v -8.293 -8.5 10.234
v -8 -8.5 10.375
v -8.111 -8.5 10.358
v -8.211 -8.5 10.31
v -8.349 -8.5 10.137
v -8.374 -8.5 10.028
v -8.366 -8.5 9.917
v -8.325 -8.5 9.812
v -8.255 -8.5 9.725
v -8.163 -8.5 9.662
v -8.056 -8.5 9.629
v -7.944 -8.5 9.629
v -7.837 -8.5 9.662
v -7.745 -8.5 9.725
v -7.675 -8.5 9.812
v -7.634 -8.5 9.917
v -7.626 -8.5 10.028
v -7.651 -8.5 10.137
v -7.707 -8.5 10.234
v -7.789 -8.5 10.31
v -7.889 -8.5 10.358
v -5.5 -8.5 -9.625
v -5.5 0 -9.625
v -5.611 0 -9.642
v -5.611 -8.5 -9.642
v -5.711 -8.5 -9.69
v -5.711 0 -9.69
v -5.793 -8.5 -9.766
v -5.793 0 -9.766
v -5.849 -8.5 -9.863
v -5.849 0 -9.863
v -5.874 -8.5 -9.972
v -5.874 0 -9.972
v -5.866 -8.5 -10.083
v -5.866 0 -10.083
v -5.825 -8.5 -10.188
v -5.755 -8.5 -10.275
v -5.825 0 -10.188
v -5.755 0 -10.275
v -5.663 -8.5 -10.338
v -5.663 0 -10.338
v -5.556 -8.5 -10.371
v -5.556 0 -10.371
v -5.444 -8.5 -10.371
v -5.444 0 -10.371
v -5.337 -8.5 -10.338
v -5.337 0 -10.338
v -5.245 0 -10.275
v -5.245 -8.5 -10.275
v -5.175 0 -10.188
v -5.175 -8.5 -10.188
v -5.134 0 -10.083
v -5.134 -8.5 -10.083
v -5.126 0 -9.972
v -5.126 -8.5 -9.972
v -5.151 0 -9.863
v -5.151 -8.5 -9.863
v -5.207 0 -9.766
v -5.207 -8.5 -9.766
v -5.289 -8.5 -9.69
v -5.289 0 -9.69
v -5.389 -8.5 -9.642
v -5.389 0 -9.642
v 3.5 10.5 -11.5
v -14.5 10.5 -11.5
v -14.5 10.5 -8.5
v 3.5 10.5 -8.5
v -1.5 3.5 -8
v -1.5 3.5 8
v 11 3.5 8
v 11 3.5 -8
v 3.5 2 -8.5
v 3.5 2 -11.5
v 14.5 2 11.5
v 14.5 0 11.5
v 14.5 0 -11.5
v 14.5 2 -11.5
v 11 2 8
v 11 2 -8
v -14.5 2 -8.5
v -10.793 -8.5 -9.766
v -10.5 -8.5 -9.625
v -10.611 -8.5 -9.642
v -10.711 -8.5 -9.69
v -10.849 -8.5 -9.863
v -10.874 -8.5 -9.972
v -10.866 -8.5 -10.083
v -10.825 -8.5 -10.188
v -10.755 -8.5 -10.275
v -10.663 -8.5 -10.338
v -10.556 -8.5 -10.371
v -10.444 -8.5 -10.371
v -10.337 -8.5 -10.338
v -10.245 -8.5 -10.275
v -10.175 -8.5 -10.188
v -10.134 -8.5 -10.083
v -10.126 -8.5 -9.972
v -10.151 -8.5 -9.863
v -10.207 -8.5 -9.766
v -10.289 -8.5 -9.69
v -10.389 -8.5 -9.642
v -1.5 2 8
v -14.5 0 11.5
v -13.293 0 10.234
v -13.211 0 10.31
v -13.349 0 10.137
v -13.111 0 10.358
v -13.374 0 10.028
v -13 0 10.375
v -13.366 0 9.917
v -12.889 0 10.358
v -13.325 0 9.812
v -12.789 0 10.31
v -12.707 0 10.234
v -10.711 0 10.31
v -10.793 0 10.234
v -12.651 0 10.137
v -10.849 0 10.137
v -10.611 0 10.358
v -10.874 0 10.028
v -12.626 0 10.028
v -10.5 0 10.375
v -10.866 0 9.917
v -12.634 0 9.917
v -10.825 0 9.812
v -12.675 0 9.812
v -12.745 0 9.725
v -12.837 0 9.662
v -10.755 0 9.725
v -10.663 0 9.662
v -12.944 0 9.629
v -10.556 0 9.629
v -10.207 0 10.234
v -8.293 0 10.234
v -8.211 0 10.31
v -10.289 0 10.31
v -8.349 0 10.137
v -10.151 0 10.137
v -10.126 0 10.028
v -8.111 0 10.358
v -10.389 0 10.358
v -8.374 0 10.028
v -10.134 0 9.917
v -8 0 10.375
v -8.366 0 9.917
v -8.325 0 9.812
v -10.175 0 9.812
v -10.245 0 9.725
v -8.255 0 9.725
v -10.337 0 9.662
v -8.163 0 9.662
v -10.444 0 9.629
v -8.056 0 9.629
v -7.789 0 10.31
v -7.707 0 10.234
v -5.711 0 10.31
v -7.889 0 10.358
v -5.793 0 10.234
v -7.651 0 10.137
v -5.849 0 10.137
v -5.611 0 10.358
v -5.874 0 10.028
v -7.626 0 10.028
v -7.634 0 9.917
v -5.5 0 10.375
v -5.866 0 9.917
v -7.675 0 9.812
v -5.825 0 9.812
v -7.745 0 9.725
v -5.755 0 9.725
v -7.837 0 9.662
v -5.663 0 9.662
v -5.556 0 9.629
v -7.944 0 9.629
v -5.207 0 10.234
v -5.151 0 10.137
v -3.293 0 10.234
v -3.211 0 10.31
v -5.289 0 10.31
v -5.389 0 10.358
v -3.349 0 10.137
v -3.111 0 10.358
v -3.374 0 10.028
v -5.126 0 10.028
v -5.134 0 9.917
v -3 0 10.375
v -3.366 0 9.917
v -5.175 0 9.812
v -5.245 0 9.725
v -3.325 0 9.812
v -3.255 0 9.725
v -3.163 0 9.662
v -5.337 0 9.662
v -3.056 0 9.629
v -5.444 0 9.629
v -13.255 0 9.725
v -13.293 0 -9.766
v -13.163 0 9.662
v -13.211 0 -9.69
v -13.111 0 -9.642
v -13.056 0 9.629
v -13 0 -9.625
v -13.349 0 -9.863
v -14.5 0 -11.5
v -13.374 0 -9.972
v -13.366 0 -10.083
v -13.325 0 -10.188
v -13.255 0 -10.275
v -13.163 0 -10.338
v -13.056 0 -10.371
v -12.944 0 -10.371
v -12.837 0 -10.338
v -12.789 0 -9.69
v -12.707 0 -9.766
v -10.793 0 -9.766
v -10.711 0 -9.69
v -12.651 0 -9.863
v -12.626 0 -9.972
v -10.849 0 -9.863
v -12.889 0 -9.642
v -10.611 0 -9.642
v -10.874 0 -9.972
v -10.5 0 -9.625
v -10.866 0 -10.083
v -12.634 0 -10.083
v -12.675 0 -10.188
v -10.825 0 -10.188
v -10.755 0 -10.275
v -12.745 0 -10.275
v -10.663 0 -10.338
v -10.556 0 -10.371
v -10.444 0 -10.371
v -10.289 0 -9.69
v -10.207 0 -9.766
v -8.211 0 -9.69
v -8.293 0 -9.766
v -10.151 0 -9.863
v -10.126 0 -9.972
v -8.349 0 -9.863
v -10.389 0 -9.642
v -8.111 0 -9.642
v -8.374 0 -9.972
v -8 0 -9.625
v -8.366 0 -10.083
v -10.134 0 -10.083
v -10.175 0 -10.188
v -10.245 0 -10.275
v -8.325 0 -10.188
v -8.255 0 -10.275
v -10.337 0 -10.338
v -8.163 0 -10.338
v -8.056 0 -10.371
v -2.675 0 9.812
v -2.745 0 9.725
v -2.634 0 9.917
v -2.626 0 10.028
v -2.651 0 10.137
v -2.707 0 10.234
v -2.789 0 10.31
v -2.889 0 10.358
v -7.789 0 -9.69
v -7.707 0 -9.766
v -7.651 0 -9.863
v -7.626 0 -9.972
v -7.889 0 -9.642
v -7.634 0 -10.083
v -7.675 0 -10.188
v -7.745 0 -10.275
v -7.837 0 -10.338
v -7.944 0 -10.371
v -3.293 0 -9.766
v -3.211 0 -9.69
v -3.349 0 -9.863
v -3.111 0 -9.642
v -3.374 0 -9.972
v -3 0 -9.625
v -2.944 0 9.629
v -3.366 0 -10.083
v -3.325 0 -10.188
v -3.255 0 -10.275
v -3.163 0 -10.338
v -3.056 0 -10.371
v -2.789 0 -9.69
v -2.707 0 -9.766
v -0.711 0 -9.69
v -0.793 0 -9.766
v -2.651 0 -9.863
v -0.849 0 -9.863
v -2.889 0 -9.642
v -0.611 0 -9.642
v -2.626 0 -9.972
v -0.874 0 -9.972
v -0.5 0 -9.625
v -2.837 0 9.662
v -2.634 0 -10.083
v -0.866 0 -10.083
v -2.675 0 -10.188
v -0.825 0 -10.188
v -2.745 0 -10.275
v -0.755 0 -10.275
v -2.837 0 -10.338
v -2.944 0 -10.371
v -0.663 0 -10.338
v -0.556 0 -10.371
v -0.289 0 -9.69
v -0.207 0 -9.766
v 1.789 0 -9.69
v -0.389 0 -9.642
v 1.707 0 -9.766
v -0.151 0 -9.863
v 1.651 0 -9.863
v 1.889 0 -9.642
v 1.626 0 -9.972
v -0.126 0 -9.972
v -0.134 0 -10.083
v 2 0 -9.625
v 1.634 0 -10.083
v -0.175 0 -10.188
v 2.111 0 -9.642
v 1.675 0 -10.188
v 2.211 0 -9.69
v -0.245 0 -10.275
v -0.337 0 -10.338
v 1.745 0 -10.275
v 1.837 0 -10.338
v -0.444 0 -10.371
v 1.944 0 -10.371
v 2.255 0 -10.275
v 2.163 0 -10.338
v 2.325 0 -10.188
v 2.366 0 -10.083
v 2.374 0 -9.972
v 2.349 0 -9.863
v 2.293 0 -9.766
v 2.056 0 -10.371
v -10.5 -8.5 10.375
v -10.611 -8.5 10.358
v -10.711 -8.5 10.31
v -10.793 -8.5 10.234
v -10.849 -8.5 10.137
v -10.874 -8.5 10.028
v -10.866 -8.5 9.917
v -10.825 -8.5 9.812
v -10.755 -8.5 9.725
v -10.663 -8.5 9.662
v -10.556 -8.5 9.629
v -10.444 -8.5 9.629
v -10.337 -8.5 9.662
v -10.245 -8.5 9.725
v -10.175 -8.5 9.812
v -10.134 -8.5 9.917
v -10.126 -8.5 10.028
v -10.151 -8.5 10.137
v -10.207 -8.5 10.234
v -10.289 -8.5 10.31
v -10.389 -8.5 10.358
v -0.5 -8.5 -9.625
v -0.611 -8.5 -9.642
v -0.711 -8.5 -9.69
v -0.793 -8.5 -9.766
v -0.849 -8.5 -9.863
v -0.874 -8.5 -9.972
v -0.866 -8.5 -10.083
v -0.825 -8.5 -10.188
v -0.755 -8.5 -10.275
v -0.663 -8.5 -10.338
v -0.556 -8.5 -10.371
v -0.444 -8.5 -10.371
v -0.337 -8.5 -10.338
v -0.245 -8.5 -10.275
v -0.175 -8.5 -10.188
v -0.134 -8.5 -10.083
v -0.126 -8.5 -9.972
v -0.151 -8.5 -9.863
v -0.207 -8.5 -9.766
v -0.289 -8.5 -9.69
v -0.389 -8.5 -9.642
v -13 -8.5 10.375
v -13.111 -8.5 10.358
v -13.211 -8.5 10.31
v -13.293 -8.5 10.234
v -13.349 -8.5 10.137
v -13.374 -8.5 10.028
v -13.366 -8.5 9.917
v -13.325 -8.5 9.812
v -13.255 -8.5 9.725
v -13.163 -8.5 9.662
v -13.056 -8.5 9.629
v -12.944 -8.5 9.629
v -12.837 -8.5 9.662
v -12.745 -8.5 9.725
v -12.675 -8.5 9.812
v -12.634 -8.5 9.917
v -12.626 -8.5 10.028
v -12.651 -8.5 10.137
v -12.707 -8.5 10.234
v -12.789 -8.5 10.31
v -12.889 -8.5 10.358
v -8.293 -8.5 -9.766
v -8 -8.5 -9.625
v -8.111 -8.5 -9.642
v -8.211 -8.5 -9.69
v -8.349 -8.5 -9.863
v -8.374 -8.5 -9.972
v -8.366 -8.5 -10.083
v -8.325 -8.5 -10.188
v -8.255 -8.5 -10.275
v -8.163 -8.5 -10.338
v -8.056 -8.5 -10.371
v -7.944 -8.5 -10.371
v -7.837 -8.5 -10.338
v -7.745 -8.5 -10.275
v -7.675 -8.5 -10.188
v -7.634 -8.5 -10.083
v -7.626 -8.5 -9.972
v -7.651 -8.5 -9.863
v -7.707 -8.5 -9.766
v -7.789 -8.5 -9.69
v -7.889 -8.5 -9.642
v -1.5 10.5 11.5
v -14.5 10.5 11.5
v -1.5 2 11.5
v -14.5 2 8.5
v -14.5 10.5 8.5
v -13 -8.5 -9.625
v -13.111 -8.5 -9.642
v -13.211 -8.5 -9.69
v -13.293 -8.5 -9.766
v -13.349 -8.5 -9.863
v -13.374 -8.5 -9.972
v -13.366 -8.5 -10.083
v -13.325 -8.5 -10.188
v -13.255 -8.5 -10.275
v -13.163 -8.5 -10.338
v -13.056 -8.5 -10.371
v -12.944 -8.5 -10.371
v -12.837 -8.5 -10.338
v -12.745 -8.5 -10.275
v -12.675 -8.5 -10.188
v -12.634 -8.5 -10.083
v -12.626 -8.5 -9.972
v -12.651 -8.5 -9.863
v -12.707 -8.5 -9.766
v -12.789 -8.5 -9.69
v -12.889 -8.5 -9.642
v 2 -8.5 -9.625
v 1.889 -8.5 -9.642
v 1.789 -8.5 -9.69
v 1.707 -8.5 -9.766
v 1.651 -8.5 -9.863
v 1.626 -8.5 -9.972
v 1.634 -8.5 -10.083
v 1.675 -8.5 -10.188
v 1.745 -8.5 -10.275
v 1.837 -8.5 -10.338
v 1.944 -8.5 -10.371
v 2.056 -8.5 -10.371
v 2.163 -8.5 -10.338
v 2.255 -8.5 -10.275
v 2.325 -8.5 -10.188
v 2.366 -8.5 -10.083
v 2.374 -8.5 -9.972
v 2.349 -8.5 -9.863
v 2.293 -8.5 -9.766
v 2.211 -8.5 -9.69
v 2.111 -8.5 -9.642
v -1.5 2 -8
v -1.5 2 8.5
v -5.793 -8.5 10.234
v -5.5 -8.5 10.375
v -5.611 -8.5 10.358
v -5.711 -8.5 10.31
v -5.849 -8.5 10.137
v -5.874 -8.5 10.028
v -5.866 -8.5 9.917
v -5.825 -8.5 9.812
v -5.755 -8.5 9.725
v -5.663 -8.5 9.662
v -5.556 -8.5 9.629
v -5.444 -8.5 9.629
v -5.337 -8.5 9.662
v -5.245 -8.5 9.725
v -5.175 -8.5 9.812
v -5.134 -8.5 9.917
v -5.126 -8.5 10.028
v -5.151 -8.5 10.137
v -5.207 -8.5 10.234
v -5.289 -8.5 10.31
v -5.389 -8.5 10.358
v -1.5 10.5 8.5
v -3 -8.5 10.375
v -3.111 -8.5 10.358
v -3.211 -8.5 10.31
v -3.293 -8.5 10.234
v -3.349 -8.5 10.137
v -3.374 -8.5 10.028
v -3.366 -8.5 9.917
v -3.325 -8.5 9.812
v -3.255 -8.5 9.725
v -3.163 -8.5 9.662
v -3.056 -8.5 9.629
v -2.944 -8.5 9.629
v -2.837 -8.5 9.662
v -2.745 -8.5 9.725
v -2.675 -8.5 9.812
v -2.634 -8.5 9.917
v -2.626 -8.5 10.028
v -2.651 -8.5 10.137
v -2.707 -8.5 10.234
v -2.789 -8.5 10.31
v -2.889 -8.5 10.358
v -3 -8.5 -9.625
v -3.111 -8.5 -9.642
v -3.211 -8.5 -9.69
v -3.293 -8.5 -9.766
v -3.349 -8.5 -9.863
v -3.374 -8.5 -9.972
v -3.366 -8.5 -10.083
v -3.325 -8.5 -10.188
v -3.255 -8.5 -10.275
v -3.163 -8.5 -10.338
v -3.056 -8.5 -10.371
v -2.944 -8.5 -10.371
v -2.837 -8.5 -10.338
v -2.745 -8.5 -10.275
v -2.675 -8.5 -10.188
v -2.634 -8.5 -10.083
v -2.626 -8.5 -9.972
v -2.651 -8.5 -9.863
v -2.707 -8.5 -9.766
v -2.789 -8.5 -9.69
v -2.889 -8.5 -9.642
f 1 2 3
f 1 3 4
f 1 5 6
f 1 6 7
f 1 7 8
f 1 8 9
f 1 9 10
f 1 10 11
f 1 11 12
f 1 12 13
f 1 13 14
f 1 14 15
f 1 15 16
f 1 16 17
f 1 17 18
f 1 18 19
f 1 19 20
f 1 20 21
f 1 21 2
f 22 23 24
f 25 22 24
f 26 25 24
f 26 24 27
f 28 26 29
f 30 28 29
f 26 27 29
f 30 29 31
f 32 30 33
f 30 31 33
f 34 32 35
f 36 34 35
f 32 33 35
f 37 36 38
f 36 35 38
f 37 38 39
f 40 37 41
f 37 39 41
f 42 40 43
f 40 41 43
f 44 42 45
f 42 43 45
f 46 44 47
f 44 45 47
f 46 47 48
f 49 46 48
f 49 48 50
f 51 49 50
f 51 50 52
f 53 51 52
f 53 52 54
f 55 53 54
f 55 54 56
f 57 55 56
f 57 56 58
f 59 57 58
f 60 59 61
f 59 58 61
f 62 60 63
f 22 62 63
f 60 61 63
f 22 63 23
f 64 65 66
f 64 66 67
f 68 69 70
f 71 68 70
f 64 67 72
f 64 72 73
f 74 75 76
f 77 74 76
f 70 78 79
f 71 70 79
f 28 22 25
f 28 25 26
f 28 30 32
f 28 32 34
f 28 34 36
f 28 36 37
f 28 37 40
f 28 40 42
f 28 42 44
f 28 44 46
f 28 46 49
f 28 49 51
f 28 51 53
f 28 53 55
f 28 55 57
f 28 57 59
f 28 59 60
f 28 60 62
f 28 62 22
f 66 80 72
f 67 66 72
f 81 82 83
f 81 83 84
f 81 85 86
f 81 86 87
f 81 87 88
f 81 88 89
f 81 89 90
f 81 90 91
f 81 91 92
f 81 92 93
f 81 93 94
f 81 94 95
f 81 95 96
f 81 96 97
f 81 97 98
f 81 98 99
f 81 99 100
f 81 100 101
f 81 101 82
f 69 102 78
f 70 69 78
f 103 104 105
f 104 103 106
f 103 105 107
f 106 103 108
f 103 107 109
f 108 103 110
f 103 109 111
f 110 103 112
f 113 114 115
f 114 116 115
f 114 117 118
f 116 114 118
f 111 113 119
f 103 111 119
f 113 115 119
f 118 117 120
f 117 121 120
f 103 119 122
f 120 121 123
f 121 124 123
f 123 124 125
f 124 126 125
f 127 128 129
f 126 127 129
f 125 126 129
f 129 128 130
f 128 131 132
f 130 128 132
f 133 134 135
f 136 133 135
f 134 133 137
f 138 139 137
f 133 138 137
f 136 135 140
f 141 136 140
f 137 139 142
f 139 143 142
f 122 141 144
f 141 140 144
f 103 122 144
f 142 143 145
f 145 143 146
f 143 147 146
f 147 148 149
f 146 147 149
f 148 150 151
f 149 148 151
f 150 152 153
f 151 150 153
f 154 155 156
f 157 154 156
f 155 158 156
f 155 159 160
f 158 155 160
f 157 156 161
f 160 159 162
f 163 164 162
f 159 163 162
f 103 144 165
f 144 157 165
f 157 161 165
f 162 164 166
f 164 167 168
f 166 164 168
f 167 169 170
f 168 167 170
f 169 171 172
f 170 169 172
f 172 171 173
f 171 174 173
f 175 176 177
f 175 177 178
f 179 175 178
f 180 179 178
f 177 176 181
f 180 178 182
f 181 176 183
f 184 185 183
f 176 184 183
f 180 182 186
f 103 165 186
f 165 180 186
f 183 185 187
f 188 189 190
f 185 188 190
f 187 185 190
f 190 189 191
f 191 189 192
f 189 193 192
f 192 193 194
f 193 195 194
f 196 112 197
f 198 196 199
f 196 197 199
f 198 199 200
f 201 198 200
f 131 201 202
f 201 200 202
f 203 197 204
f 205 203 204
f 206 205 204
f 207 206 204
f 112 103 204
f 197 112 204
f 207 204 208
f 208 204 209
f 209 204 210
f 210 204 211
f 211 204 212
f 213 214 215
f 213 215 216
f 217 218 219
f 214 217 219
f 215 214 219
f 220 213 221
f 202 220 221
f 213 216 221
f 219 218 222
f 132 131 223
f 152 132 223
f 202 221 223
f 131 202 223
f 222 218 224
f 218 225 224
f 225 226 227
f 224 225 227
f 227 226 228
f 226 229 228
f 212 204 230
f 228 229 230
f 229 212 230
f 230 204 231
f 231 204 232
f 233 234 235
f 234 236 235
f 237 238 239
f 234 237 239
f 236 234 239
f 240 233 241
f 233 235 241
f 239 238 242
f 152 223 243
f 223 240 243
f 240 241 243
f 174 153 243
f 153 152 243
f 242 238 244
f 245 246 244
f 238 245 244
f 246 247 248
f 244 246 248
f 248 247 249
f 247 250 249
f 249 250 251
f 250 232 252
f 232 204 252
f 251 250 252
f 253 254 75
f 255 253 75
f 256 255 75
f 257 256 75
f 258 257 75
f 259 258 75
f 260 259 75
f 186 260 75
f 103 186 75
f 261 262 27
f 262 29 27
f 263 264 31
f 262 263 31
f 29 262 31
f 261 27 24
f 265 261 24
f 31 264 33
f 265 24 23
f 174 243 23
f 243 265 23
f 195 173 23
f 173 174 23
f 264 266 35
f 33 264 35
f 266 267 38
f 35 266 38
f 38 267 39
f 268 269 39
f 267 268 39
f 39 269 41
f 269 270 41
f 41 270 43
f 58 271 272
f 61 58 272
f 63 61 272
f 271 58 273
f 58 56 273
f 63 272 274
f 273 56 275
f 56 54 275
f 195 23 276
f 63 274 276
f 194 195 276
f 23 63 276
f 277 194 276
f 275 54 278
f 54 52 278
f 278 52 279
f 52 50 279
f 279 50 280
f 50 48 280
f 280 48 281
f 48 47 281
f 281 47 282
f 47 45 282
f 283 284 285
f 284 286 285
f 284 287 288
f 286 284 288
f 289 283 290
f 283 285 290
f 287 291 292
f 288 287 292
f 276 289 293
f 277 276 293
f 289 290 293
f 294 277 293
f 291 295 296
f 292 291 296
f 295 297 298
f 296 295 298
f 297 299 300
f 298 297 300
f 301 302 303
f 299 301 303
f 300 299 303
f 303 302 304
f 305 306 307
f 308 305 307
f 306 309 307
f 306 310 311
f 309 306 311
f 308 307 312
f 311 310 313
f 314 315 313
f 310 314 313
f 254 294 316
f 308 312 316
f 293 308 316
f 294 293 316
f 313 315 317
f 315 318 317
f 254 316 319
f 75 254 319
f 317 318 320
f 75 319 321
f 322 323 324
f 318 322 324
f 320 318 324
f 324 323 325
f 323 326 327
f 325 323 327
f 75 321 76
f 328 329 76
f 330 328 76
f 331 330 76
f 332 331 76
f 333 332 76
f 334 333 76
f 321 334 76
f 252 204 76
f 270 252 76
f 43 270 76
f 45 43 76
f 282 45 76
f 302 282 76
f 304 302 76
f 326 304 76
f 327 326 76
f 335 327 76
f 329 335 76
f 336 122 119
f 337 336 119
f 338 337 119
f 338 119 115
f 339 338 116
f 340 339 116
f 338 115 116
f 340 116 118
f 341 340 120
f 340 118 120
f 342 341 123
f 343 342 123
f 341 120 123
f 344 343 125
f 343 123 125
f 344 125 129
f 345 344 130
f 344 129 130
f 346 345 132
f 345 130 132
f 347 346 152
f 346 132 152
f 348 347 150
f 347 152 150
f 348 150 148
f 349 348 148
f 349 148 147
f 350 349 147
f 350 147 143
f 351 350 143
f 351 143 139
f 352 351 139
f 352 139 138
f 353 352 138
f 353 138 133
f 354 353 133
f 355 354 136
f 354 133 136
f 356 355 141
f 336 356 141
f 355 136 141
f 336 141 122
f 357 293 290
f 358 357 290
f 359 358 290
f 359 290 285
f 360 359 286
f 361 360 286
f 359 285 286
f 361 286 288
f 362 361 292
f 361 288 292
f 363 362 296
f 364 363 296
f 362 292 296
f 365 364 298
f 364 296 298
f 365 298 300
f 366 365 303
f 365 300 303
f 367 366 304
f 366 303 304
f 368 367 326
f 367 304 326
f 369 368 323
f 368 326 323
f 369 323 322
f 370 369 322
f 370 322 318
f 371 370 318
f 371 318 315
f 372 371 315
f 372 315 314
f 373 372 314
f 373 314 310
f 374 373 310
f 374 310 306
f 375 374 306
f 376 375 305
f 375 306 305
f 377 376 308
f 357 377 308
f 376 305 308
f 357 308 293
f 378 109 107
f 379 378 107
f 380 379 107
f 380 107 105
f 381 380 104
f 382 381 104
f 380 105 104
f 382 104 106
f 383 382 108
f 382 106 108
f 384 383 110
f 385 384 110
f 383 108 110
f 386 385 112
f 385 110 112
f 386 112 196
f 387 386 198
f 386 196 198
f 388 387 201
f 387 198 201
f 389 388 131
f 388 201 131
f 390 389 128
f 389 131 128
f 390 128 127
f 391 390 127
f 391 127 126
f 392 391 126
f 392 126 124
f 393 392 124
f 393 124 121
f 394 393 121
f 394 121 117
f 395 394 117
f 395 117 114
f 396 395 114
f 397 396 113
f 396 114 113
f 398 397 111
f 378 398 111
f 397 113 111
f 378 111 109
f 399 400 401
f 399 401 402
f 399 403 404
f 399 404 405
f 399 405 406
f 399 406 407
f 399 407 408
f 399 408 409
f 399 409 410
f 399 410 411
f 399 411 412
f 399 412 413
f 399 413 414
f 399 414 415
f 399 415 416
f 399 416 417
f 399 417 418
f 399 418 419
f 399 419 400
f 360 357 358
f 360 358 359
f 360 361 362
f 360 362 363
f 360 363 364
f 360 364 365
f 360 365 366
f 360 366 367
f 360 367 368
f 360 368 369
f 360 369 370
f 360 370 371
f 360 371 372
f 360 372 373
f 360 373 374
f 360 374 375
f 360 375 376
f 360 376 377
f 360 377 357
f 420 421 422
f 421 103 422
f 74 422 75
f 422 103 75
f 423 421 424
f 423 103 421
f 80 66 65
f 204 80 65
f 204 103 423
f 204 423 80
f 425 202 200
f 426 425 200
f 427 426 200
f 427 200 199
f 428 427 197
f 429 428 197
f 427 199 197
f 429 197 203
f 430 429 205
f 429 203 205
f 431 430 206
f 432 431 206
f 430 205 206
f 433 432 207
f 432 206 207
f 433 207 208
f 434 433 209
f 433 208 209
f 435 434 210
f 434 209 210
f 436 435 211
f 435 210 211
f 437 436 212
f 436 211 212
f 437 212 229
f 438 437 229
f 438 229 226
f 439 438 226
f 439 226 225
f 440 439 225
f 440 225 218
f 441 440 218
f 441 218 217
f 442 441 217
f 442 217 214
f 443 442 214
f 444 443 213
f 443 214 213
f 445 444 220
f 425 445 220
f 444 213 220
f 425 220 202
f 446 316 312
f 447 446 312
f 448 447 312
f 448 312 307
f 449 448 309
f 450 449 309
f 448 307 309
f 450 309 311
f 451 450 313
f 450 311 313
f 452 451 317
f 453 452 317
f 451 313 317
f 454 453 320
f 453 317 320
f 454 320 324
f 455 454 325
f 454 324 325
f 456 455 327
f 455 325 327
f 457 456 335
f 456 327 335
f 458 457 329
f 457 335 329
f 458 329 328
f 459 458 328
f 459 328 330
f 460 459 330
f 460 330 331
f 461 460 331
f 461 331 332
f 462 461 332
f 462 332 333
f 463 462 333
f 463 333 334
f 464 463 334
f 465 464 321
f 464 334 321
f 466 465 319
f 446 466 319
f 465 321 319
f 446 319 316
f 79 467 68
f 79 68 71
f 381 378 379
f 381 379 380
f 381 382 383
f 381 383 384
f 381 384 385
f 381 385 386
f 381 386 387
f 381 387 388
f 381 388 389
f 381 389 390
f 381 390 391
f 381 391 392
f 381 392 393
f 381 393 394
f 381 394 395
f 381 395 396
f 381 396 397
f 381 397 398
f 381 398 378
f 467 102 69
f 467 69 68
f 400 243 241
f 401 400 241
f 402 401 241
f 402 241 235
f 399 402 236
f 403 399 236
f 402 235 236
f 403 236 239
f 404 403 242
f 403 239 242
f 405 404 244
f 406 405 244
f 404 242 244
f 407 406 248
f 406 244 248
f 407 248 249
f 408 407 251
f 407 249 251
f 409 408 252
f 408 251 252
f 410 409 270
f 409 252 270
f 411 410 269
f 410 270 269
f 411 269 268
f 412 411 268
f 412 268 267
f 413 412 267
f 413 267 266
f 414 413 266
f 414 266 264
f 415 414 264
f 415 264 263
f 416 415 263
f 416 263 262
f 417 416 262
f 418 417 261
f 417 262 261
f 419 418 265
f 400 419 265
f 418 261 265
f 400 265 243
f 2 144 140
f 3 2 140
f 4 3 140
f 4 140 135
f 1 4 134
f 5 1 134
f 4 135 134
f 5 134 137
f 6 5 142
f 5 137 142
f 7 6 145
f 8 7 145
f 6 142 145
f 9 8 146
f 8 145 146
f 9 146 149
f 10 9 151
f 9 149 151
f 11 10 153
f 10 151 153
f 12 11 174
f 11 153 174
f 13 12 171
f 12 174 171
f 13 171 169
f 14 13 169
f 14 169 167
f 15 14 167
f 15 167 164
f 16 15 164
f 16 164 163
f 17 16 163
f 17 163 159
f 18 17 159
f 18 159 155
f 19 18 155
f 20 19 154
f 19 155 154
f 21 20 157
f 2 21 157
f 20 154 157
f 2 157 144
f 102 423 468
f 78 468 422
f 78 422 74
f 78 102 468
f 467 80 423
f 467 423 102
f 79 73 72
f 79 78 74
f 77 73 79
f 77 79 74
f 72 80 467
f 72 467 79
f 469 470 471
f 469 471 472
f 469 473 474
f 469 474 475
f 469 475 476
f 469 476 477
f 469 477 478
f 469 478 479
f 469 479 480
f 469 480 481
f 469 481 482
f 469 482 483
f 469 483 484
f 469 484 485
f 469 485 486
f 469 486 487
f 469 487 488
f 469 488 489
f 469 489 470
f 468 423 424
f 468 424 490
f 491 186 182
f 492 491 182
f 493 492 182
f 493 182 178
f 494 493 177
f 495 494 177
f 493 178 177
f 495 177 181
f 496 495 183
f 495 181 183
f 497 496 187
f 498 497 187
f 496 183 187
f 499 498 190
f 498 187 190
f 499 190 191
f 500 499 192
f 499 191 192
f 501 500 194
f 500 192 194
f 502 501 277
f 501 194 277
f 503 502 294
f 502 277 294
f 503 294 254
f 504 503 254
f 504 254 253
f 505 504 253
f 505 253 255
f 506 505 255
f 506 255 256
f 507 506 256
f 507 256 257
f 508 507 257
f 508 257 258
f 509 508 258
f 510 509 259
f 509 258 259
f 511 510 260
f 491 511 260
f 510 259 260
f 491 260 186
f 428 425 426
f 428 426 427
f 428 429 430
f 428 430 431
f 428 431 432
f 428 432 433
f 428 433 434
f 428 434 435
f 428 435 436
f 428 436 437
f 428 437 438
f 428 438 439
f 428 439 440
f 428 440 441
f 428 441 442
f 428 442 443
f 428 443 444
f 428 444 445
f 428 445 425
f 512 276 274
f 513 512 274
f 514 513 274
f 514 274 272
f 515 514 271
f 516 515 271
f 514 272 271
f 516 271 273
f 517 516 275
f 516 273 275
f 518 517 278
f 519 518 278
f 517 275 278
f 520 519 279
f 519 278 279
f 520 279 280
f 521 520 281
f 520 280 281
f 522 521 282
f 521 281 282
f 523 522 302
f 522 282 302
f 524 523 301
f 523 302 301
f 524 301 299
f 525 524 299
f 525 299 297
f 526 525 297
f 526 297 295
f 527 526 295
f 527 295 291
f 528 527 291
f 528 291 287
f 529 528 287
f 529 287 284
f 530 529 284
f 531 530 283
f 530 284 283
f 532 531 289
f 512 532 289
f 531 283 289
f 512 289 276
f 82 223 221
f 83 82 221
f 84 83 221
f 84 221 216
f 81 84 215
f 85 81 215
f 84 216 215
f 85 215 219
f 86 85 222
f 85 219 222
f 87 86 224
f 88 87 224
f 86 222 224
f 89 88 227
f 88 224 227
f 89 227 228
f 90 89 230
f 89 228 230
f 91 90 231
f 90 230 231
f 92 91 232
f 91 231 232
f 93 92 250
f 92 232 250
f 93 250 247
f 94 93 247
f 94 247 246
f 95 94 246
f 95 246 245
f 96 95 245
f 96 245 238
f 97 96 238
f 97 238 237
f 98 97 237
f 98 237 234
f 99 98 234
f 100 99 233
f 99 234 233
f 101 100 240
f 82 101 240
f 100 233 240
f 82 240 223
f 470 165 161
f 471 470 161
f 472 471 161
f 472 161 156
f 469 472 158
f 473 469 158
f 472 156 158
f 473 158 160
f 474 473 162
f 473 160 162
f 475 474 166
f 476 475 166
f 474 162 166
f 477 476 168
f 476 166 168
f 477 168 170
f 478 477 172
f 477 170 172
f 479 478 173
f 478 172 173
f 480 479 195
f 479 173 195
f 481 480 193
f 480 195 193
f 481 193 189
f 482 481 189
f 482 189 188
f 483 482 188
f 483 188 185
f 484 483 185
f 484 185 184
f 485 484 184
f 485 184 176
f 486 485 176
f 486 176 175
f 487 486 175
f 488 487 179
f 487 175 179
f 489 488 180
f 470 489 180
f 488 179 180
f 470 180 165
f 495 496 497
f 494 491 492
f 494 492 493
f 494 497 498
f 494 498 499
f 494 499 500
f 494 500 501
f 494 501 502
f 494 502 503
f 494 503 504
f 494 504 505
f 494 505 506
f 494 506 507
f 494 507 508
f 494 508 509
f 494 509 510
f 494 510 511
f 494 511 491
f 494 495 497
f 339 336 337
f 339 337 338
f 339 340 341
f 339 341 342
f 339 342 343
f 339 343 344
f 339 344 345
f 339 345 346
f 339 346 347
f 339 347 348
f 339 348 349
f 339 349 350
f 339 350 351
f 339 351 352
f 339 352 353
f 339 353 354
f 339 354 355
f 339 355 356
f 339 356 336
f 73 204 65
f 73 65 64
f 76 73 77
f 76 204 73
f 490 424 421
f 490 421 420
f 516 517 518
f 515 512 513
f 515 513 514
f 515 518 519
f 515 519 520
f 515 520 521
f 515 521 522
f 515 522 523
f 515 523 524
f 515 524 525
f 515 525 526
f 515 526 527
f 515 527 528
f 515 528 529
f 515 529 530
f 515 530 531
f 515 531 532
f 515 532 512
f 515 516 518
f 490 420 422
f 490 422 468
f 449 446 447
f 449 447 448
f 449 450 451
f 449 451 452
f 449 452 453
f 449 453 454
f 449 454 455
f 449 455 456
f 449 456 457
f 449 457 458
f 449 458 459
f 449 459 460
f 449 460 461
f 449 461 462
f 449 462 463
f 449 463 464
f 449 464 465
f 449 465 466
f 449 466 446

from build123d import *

# Parameters (mm, degrees)
SKETCH1_W           = 29
SKETCH1_H           = 23
BOSS_EXTRUDE1_DEPTH = 2
SKETCH2_W           = 13
SKETCH2_H           = 3
SKETCH2_W_2         = 18
BOSS_EXTRUDE2_DEPTH = 8.5
SKETCH3_R           = 0.375
BOSS_EXTRUDE3_DEPTH = 8.5
SKETCH5_W           = 12.5
SKETCH5_H           = 16
BOSS_EXTRUDE4_DEPTH = 1.5


with BuildPart() as part:
    # Sketch1 → Boss-Extrude1 (new body)
    with BuildSketch(Plane(origin=(0, 0, 0), x_dir=(1, 0, 0), z_dir=(0, 1, 0))):
        Rectangle(SKETCH1_W, SKETCH1_H)
    extrude(amount=BOSS_EXTRUDE1_DEPTH)

    # Sketch2 → Boss-Extrude2 (add)
    with BuildSketch(Plane(origin=(0, 2, 0), x_dir=(1, 0, 0), z_dir=(0, 1, 0))):
        with Locations((-8, -10)):
            Rectangle(SKETCH2_W, SKETCH2_H)
        with Locations((-5.5, 10)):
            Rectangle(SKETCH2_W_2, SKETCH2_H)
    extrude(amount=BOSS_EXTRUDE2_DEPTH)

    # Sketch3 → Boss-Extrude3 (add)
    with BuildSketch(Plane.XZ):
        with Locations(Location((2, -10, 0), (0, 0, 90))):
            Circle(SKETCH3_R)
        with Locations(Location((-0.5, -10, 0), (0, 0, 90))):
            Circle(SKETCH3_R)
        with Locations(Location((-3, -10, 0), (0, 0, 90))):
            Circle(SKETCH3_R)
        with Locations(Location((-5.5, -10, 0), (0, 0, 90))):
            Circle(SKETCH3_R)
        with Locations(Location((-8, -10, 0), (0, 0, 90))):
            Circle(SKETCH3_R)
        with Locations(Location((-3, 10, 0), (0, 0, 90))):
            Circle(SKETCH3_R)
        with Locations(Location((-5.5, 10, 0), (0, 0, 90))):
            Circle(SKETCH3_R)
        with Locations(Location((-8, 10, 0), (0, 0, 90))):
            Circle(SKETCH3_R)
        with Locations(Location((-10.5, 10, 0), (0, 0, 90))):
            Circle(SKETCH3_R)
        with Locations(Location((-13, 10, 0), (0, 0, 90))):
            Circle(SKETCH3_R)
        with Locations(Location((-10.5, -10, 0), (0, 0, 90))):
            Circle(SKETCH3_R)
        with Locations(Location((-13, -10, 0), (0, 0, 90))):
            Circle(SKETCH3_R)
    extrude(amount=BOSS_EXTRUDE3_DEPTH)

    # Sketch5 → Boss-Extrude4 (add)
    with BuildSketch(Plane(origin=(0, 2, 0), x_dir=(1, 0, 0), z_dir=(0, 1, 0))):
        with Locations((4.75, 0)):
            Rectangle(SKETCH5_W, SKETCH5_H)
    extrude(amount=BOSS_EXTRUDE4_DEPTH)


solid = part.part
